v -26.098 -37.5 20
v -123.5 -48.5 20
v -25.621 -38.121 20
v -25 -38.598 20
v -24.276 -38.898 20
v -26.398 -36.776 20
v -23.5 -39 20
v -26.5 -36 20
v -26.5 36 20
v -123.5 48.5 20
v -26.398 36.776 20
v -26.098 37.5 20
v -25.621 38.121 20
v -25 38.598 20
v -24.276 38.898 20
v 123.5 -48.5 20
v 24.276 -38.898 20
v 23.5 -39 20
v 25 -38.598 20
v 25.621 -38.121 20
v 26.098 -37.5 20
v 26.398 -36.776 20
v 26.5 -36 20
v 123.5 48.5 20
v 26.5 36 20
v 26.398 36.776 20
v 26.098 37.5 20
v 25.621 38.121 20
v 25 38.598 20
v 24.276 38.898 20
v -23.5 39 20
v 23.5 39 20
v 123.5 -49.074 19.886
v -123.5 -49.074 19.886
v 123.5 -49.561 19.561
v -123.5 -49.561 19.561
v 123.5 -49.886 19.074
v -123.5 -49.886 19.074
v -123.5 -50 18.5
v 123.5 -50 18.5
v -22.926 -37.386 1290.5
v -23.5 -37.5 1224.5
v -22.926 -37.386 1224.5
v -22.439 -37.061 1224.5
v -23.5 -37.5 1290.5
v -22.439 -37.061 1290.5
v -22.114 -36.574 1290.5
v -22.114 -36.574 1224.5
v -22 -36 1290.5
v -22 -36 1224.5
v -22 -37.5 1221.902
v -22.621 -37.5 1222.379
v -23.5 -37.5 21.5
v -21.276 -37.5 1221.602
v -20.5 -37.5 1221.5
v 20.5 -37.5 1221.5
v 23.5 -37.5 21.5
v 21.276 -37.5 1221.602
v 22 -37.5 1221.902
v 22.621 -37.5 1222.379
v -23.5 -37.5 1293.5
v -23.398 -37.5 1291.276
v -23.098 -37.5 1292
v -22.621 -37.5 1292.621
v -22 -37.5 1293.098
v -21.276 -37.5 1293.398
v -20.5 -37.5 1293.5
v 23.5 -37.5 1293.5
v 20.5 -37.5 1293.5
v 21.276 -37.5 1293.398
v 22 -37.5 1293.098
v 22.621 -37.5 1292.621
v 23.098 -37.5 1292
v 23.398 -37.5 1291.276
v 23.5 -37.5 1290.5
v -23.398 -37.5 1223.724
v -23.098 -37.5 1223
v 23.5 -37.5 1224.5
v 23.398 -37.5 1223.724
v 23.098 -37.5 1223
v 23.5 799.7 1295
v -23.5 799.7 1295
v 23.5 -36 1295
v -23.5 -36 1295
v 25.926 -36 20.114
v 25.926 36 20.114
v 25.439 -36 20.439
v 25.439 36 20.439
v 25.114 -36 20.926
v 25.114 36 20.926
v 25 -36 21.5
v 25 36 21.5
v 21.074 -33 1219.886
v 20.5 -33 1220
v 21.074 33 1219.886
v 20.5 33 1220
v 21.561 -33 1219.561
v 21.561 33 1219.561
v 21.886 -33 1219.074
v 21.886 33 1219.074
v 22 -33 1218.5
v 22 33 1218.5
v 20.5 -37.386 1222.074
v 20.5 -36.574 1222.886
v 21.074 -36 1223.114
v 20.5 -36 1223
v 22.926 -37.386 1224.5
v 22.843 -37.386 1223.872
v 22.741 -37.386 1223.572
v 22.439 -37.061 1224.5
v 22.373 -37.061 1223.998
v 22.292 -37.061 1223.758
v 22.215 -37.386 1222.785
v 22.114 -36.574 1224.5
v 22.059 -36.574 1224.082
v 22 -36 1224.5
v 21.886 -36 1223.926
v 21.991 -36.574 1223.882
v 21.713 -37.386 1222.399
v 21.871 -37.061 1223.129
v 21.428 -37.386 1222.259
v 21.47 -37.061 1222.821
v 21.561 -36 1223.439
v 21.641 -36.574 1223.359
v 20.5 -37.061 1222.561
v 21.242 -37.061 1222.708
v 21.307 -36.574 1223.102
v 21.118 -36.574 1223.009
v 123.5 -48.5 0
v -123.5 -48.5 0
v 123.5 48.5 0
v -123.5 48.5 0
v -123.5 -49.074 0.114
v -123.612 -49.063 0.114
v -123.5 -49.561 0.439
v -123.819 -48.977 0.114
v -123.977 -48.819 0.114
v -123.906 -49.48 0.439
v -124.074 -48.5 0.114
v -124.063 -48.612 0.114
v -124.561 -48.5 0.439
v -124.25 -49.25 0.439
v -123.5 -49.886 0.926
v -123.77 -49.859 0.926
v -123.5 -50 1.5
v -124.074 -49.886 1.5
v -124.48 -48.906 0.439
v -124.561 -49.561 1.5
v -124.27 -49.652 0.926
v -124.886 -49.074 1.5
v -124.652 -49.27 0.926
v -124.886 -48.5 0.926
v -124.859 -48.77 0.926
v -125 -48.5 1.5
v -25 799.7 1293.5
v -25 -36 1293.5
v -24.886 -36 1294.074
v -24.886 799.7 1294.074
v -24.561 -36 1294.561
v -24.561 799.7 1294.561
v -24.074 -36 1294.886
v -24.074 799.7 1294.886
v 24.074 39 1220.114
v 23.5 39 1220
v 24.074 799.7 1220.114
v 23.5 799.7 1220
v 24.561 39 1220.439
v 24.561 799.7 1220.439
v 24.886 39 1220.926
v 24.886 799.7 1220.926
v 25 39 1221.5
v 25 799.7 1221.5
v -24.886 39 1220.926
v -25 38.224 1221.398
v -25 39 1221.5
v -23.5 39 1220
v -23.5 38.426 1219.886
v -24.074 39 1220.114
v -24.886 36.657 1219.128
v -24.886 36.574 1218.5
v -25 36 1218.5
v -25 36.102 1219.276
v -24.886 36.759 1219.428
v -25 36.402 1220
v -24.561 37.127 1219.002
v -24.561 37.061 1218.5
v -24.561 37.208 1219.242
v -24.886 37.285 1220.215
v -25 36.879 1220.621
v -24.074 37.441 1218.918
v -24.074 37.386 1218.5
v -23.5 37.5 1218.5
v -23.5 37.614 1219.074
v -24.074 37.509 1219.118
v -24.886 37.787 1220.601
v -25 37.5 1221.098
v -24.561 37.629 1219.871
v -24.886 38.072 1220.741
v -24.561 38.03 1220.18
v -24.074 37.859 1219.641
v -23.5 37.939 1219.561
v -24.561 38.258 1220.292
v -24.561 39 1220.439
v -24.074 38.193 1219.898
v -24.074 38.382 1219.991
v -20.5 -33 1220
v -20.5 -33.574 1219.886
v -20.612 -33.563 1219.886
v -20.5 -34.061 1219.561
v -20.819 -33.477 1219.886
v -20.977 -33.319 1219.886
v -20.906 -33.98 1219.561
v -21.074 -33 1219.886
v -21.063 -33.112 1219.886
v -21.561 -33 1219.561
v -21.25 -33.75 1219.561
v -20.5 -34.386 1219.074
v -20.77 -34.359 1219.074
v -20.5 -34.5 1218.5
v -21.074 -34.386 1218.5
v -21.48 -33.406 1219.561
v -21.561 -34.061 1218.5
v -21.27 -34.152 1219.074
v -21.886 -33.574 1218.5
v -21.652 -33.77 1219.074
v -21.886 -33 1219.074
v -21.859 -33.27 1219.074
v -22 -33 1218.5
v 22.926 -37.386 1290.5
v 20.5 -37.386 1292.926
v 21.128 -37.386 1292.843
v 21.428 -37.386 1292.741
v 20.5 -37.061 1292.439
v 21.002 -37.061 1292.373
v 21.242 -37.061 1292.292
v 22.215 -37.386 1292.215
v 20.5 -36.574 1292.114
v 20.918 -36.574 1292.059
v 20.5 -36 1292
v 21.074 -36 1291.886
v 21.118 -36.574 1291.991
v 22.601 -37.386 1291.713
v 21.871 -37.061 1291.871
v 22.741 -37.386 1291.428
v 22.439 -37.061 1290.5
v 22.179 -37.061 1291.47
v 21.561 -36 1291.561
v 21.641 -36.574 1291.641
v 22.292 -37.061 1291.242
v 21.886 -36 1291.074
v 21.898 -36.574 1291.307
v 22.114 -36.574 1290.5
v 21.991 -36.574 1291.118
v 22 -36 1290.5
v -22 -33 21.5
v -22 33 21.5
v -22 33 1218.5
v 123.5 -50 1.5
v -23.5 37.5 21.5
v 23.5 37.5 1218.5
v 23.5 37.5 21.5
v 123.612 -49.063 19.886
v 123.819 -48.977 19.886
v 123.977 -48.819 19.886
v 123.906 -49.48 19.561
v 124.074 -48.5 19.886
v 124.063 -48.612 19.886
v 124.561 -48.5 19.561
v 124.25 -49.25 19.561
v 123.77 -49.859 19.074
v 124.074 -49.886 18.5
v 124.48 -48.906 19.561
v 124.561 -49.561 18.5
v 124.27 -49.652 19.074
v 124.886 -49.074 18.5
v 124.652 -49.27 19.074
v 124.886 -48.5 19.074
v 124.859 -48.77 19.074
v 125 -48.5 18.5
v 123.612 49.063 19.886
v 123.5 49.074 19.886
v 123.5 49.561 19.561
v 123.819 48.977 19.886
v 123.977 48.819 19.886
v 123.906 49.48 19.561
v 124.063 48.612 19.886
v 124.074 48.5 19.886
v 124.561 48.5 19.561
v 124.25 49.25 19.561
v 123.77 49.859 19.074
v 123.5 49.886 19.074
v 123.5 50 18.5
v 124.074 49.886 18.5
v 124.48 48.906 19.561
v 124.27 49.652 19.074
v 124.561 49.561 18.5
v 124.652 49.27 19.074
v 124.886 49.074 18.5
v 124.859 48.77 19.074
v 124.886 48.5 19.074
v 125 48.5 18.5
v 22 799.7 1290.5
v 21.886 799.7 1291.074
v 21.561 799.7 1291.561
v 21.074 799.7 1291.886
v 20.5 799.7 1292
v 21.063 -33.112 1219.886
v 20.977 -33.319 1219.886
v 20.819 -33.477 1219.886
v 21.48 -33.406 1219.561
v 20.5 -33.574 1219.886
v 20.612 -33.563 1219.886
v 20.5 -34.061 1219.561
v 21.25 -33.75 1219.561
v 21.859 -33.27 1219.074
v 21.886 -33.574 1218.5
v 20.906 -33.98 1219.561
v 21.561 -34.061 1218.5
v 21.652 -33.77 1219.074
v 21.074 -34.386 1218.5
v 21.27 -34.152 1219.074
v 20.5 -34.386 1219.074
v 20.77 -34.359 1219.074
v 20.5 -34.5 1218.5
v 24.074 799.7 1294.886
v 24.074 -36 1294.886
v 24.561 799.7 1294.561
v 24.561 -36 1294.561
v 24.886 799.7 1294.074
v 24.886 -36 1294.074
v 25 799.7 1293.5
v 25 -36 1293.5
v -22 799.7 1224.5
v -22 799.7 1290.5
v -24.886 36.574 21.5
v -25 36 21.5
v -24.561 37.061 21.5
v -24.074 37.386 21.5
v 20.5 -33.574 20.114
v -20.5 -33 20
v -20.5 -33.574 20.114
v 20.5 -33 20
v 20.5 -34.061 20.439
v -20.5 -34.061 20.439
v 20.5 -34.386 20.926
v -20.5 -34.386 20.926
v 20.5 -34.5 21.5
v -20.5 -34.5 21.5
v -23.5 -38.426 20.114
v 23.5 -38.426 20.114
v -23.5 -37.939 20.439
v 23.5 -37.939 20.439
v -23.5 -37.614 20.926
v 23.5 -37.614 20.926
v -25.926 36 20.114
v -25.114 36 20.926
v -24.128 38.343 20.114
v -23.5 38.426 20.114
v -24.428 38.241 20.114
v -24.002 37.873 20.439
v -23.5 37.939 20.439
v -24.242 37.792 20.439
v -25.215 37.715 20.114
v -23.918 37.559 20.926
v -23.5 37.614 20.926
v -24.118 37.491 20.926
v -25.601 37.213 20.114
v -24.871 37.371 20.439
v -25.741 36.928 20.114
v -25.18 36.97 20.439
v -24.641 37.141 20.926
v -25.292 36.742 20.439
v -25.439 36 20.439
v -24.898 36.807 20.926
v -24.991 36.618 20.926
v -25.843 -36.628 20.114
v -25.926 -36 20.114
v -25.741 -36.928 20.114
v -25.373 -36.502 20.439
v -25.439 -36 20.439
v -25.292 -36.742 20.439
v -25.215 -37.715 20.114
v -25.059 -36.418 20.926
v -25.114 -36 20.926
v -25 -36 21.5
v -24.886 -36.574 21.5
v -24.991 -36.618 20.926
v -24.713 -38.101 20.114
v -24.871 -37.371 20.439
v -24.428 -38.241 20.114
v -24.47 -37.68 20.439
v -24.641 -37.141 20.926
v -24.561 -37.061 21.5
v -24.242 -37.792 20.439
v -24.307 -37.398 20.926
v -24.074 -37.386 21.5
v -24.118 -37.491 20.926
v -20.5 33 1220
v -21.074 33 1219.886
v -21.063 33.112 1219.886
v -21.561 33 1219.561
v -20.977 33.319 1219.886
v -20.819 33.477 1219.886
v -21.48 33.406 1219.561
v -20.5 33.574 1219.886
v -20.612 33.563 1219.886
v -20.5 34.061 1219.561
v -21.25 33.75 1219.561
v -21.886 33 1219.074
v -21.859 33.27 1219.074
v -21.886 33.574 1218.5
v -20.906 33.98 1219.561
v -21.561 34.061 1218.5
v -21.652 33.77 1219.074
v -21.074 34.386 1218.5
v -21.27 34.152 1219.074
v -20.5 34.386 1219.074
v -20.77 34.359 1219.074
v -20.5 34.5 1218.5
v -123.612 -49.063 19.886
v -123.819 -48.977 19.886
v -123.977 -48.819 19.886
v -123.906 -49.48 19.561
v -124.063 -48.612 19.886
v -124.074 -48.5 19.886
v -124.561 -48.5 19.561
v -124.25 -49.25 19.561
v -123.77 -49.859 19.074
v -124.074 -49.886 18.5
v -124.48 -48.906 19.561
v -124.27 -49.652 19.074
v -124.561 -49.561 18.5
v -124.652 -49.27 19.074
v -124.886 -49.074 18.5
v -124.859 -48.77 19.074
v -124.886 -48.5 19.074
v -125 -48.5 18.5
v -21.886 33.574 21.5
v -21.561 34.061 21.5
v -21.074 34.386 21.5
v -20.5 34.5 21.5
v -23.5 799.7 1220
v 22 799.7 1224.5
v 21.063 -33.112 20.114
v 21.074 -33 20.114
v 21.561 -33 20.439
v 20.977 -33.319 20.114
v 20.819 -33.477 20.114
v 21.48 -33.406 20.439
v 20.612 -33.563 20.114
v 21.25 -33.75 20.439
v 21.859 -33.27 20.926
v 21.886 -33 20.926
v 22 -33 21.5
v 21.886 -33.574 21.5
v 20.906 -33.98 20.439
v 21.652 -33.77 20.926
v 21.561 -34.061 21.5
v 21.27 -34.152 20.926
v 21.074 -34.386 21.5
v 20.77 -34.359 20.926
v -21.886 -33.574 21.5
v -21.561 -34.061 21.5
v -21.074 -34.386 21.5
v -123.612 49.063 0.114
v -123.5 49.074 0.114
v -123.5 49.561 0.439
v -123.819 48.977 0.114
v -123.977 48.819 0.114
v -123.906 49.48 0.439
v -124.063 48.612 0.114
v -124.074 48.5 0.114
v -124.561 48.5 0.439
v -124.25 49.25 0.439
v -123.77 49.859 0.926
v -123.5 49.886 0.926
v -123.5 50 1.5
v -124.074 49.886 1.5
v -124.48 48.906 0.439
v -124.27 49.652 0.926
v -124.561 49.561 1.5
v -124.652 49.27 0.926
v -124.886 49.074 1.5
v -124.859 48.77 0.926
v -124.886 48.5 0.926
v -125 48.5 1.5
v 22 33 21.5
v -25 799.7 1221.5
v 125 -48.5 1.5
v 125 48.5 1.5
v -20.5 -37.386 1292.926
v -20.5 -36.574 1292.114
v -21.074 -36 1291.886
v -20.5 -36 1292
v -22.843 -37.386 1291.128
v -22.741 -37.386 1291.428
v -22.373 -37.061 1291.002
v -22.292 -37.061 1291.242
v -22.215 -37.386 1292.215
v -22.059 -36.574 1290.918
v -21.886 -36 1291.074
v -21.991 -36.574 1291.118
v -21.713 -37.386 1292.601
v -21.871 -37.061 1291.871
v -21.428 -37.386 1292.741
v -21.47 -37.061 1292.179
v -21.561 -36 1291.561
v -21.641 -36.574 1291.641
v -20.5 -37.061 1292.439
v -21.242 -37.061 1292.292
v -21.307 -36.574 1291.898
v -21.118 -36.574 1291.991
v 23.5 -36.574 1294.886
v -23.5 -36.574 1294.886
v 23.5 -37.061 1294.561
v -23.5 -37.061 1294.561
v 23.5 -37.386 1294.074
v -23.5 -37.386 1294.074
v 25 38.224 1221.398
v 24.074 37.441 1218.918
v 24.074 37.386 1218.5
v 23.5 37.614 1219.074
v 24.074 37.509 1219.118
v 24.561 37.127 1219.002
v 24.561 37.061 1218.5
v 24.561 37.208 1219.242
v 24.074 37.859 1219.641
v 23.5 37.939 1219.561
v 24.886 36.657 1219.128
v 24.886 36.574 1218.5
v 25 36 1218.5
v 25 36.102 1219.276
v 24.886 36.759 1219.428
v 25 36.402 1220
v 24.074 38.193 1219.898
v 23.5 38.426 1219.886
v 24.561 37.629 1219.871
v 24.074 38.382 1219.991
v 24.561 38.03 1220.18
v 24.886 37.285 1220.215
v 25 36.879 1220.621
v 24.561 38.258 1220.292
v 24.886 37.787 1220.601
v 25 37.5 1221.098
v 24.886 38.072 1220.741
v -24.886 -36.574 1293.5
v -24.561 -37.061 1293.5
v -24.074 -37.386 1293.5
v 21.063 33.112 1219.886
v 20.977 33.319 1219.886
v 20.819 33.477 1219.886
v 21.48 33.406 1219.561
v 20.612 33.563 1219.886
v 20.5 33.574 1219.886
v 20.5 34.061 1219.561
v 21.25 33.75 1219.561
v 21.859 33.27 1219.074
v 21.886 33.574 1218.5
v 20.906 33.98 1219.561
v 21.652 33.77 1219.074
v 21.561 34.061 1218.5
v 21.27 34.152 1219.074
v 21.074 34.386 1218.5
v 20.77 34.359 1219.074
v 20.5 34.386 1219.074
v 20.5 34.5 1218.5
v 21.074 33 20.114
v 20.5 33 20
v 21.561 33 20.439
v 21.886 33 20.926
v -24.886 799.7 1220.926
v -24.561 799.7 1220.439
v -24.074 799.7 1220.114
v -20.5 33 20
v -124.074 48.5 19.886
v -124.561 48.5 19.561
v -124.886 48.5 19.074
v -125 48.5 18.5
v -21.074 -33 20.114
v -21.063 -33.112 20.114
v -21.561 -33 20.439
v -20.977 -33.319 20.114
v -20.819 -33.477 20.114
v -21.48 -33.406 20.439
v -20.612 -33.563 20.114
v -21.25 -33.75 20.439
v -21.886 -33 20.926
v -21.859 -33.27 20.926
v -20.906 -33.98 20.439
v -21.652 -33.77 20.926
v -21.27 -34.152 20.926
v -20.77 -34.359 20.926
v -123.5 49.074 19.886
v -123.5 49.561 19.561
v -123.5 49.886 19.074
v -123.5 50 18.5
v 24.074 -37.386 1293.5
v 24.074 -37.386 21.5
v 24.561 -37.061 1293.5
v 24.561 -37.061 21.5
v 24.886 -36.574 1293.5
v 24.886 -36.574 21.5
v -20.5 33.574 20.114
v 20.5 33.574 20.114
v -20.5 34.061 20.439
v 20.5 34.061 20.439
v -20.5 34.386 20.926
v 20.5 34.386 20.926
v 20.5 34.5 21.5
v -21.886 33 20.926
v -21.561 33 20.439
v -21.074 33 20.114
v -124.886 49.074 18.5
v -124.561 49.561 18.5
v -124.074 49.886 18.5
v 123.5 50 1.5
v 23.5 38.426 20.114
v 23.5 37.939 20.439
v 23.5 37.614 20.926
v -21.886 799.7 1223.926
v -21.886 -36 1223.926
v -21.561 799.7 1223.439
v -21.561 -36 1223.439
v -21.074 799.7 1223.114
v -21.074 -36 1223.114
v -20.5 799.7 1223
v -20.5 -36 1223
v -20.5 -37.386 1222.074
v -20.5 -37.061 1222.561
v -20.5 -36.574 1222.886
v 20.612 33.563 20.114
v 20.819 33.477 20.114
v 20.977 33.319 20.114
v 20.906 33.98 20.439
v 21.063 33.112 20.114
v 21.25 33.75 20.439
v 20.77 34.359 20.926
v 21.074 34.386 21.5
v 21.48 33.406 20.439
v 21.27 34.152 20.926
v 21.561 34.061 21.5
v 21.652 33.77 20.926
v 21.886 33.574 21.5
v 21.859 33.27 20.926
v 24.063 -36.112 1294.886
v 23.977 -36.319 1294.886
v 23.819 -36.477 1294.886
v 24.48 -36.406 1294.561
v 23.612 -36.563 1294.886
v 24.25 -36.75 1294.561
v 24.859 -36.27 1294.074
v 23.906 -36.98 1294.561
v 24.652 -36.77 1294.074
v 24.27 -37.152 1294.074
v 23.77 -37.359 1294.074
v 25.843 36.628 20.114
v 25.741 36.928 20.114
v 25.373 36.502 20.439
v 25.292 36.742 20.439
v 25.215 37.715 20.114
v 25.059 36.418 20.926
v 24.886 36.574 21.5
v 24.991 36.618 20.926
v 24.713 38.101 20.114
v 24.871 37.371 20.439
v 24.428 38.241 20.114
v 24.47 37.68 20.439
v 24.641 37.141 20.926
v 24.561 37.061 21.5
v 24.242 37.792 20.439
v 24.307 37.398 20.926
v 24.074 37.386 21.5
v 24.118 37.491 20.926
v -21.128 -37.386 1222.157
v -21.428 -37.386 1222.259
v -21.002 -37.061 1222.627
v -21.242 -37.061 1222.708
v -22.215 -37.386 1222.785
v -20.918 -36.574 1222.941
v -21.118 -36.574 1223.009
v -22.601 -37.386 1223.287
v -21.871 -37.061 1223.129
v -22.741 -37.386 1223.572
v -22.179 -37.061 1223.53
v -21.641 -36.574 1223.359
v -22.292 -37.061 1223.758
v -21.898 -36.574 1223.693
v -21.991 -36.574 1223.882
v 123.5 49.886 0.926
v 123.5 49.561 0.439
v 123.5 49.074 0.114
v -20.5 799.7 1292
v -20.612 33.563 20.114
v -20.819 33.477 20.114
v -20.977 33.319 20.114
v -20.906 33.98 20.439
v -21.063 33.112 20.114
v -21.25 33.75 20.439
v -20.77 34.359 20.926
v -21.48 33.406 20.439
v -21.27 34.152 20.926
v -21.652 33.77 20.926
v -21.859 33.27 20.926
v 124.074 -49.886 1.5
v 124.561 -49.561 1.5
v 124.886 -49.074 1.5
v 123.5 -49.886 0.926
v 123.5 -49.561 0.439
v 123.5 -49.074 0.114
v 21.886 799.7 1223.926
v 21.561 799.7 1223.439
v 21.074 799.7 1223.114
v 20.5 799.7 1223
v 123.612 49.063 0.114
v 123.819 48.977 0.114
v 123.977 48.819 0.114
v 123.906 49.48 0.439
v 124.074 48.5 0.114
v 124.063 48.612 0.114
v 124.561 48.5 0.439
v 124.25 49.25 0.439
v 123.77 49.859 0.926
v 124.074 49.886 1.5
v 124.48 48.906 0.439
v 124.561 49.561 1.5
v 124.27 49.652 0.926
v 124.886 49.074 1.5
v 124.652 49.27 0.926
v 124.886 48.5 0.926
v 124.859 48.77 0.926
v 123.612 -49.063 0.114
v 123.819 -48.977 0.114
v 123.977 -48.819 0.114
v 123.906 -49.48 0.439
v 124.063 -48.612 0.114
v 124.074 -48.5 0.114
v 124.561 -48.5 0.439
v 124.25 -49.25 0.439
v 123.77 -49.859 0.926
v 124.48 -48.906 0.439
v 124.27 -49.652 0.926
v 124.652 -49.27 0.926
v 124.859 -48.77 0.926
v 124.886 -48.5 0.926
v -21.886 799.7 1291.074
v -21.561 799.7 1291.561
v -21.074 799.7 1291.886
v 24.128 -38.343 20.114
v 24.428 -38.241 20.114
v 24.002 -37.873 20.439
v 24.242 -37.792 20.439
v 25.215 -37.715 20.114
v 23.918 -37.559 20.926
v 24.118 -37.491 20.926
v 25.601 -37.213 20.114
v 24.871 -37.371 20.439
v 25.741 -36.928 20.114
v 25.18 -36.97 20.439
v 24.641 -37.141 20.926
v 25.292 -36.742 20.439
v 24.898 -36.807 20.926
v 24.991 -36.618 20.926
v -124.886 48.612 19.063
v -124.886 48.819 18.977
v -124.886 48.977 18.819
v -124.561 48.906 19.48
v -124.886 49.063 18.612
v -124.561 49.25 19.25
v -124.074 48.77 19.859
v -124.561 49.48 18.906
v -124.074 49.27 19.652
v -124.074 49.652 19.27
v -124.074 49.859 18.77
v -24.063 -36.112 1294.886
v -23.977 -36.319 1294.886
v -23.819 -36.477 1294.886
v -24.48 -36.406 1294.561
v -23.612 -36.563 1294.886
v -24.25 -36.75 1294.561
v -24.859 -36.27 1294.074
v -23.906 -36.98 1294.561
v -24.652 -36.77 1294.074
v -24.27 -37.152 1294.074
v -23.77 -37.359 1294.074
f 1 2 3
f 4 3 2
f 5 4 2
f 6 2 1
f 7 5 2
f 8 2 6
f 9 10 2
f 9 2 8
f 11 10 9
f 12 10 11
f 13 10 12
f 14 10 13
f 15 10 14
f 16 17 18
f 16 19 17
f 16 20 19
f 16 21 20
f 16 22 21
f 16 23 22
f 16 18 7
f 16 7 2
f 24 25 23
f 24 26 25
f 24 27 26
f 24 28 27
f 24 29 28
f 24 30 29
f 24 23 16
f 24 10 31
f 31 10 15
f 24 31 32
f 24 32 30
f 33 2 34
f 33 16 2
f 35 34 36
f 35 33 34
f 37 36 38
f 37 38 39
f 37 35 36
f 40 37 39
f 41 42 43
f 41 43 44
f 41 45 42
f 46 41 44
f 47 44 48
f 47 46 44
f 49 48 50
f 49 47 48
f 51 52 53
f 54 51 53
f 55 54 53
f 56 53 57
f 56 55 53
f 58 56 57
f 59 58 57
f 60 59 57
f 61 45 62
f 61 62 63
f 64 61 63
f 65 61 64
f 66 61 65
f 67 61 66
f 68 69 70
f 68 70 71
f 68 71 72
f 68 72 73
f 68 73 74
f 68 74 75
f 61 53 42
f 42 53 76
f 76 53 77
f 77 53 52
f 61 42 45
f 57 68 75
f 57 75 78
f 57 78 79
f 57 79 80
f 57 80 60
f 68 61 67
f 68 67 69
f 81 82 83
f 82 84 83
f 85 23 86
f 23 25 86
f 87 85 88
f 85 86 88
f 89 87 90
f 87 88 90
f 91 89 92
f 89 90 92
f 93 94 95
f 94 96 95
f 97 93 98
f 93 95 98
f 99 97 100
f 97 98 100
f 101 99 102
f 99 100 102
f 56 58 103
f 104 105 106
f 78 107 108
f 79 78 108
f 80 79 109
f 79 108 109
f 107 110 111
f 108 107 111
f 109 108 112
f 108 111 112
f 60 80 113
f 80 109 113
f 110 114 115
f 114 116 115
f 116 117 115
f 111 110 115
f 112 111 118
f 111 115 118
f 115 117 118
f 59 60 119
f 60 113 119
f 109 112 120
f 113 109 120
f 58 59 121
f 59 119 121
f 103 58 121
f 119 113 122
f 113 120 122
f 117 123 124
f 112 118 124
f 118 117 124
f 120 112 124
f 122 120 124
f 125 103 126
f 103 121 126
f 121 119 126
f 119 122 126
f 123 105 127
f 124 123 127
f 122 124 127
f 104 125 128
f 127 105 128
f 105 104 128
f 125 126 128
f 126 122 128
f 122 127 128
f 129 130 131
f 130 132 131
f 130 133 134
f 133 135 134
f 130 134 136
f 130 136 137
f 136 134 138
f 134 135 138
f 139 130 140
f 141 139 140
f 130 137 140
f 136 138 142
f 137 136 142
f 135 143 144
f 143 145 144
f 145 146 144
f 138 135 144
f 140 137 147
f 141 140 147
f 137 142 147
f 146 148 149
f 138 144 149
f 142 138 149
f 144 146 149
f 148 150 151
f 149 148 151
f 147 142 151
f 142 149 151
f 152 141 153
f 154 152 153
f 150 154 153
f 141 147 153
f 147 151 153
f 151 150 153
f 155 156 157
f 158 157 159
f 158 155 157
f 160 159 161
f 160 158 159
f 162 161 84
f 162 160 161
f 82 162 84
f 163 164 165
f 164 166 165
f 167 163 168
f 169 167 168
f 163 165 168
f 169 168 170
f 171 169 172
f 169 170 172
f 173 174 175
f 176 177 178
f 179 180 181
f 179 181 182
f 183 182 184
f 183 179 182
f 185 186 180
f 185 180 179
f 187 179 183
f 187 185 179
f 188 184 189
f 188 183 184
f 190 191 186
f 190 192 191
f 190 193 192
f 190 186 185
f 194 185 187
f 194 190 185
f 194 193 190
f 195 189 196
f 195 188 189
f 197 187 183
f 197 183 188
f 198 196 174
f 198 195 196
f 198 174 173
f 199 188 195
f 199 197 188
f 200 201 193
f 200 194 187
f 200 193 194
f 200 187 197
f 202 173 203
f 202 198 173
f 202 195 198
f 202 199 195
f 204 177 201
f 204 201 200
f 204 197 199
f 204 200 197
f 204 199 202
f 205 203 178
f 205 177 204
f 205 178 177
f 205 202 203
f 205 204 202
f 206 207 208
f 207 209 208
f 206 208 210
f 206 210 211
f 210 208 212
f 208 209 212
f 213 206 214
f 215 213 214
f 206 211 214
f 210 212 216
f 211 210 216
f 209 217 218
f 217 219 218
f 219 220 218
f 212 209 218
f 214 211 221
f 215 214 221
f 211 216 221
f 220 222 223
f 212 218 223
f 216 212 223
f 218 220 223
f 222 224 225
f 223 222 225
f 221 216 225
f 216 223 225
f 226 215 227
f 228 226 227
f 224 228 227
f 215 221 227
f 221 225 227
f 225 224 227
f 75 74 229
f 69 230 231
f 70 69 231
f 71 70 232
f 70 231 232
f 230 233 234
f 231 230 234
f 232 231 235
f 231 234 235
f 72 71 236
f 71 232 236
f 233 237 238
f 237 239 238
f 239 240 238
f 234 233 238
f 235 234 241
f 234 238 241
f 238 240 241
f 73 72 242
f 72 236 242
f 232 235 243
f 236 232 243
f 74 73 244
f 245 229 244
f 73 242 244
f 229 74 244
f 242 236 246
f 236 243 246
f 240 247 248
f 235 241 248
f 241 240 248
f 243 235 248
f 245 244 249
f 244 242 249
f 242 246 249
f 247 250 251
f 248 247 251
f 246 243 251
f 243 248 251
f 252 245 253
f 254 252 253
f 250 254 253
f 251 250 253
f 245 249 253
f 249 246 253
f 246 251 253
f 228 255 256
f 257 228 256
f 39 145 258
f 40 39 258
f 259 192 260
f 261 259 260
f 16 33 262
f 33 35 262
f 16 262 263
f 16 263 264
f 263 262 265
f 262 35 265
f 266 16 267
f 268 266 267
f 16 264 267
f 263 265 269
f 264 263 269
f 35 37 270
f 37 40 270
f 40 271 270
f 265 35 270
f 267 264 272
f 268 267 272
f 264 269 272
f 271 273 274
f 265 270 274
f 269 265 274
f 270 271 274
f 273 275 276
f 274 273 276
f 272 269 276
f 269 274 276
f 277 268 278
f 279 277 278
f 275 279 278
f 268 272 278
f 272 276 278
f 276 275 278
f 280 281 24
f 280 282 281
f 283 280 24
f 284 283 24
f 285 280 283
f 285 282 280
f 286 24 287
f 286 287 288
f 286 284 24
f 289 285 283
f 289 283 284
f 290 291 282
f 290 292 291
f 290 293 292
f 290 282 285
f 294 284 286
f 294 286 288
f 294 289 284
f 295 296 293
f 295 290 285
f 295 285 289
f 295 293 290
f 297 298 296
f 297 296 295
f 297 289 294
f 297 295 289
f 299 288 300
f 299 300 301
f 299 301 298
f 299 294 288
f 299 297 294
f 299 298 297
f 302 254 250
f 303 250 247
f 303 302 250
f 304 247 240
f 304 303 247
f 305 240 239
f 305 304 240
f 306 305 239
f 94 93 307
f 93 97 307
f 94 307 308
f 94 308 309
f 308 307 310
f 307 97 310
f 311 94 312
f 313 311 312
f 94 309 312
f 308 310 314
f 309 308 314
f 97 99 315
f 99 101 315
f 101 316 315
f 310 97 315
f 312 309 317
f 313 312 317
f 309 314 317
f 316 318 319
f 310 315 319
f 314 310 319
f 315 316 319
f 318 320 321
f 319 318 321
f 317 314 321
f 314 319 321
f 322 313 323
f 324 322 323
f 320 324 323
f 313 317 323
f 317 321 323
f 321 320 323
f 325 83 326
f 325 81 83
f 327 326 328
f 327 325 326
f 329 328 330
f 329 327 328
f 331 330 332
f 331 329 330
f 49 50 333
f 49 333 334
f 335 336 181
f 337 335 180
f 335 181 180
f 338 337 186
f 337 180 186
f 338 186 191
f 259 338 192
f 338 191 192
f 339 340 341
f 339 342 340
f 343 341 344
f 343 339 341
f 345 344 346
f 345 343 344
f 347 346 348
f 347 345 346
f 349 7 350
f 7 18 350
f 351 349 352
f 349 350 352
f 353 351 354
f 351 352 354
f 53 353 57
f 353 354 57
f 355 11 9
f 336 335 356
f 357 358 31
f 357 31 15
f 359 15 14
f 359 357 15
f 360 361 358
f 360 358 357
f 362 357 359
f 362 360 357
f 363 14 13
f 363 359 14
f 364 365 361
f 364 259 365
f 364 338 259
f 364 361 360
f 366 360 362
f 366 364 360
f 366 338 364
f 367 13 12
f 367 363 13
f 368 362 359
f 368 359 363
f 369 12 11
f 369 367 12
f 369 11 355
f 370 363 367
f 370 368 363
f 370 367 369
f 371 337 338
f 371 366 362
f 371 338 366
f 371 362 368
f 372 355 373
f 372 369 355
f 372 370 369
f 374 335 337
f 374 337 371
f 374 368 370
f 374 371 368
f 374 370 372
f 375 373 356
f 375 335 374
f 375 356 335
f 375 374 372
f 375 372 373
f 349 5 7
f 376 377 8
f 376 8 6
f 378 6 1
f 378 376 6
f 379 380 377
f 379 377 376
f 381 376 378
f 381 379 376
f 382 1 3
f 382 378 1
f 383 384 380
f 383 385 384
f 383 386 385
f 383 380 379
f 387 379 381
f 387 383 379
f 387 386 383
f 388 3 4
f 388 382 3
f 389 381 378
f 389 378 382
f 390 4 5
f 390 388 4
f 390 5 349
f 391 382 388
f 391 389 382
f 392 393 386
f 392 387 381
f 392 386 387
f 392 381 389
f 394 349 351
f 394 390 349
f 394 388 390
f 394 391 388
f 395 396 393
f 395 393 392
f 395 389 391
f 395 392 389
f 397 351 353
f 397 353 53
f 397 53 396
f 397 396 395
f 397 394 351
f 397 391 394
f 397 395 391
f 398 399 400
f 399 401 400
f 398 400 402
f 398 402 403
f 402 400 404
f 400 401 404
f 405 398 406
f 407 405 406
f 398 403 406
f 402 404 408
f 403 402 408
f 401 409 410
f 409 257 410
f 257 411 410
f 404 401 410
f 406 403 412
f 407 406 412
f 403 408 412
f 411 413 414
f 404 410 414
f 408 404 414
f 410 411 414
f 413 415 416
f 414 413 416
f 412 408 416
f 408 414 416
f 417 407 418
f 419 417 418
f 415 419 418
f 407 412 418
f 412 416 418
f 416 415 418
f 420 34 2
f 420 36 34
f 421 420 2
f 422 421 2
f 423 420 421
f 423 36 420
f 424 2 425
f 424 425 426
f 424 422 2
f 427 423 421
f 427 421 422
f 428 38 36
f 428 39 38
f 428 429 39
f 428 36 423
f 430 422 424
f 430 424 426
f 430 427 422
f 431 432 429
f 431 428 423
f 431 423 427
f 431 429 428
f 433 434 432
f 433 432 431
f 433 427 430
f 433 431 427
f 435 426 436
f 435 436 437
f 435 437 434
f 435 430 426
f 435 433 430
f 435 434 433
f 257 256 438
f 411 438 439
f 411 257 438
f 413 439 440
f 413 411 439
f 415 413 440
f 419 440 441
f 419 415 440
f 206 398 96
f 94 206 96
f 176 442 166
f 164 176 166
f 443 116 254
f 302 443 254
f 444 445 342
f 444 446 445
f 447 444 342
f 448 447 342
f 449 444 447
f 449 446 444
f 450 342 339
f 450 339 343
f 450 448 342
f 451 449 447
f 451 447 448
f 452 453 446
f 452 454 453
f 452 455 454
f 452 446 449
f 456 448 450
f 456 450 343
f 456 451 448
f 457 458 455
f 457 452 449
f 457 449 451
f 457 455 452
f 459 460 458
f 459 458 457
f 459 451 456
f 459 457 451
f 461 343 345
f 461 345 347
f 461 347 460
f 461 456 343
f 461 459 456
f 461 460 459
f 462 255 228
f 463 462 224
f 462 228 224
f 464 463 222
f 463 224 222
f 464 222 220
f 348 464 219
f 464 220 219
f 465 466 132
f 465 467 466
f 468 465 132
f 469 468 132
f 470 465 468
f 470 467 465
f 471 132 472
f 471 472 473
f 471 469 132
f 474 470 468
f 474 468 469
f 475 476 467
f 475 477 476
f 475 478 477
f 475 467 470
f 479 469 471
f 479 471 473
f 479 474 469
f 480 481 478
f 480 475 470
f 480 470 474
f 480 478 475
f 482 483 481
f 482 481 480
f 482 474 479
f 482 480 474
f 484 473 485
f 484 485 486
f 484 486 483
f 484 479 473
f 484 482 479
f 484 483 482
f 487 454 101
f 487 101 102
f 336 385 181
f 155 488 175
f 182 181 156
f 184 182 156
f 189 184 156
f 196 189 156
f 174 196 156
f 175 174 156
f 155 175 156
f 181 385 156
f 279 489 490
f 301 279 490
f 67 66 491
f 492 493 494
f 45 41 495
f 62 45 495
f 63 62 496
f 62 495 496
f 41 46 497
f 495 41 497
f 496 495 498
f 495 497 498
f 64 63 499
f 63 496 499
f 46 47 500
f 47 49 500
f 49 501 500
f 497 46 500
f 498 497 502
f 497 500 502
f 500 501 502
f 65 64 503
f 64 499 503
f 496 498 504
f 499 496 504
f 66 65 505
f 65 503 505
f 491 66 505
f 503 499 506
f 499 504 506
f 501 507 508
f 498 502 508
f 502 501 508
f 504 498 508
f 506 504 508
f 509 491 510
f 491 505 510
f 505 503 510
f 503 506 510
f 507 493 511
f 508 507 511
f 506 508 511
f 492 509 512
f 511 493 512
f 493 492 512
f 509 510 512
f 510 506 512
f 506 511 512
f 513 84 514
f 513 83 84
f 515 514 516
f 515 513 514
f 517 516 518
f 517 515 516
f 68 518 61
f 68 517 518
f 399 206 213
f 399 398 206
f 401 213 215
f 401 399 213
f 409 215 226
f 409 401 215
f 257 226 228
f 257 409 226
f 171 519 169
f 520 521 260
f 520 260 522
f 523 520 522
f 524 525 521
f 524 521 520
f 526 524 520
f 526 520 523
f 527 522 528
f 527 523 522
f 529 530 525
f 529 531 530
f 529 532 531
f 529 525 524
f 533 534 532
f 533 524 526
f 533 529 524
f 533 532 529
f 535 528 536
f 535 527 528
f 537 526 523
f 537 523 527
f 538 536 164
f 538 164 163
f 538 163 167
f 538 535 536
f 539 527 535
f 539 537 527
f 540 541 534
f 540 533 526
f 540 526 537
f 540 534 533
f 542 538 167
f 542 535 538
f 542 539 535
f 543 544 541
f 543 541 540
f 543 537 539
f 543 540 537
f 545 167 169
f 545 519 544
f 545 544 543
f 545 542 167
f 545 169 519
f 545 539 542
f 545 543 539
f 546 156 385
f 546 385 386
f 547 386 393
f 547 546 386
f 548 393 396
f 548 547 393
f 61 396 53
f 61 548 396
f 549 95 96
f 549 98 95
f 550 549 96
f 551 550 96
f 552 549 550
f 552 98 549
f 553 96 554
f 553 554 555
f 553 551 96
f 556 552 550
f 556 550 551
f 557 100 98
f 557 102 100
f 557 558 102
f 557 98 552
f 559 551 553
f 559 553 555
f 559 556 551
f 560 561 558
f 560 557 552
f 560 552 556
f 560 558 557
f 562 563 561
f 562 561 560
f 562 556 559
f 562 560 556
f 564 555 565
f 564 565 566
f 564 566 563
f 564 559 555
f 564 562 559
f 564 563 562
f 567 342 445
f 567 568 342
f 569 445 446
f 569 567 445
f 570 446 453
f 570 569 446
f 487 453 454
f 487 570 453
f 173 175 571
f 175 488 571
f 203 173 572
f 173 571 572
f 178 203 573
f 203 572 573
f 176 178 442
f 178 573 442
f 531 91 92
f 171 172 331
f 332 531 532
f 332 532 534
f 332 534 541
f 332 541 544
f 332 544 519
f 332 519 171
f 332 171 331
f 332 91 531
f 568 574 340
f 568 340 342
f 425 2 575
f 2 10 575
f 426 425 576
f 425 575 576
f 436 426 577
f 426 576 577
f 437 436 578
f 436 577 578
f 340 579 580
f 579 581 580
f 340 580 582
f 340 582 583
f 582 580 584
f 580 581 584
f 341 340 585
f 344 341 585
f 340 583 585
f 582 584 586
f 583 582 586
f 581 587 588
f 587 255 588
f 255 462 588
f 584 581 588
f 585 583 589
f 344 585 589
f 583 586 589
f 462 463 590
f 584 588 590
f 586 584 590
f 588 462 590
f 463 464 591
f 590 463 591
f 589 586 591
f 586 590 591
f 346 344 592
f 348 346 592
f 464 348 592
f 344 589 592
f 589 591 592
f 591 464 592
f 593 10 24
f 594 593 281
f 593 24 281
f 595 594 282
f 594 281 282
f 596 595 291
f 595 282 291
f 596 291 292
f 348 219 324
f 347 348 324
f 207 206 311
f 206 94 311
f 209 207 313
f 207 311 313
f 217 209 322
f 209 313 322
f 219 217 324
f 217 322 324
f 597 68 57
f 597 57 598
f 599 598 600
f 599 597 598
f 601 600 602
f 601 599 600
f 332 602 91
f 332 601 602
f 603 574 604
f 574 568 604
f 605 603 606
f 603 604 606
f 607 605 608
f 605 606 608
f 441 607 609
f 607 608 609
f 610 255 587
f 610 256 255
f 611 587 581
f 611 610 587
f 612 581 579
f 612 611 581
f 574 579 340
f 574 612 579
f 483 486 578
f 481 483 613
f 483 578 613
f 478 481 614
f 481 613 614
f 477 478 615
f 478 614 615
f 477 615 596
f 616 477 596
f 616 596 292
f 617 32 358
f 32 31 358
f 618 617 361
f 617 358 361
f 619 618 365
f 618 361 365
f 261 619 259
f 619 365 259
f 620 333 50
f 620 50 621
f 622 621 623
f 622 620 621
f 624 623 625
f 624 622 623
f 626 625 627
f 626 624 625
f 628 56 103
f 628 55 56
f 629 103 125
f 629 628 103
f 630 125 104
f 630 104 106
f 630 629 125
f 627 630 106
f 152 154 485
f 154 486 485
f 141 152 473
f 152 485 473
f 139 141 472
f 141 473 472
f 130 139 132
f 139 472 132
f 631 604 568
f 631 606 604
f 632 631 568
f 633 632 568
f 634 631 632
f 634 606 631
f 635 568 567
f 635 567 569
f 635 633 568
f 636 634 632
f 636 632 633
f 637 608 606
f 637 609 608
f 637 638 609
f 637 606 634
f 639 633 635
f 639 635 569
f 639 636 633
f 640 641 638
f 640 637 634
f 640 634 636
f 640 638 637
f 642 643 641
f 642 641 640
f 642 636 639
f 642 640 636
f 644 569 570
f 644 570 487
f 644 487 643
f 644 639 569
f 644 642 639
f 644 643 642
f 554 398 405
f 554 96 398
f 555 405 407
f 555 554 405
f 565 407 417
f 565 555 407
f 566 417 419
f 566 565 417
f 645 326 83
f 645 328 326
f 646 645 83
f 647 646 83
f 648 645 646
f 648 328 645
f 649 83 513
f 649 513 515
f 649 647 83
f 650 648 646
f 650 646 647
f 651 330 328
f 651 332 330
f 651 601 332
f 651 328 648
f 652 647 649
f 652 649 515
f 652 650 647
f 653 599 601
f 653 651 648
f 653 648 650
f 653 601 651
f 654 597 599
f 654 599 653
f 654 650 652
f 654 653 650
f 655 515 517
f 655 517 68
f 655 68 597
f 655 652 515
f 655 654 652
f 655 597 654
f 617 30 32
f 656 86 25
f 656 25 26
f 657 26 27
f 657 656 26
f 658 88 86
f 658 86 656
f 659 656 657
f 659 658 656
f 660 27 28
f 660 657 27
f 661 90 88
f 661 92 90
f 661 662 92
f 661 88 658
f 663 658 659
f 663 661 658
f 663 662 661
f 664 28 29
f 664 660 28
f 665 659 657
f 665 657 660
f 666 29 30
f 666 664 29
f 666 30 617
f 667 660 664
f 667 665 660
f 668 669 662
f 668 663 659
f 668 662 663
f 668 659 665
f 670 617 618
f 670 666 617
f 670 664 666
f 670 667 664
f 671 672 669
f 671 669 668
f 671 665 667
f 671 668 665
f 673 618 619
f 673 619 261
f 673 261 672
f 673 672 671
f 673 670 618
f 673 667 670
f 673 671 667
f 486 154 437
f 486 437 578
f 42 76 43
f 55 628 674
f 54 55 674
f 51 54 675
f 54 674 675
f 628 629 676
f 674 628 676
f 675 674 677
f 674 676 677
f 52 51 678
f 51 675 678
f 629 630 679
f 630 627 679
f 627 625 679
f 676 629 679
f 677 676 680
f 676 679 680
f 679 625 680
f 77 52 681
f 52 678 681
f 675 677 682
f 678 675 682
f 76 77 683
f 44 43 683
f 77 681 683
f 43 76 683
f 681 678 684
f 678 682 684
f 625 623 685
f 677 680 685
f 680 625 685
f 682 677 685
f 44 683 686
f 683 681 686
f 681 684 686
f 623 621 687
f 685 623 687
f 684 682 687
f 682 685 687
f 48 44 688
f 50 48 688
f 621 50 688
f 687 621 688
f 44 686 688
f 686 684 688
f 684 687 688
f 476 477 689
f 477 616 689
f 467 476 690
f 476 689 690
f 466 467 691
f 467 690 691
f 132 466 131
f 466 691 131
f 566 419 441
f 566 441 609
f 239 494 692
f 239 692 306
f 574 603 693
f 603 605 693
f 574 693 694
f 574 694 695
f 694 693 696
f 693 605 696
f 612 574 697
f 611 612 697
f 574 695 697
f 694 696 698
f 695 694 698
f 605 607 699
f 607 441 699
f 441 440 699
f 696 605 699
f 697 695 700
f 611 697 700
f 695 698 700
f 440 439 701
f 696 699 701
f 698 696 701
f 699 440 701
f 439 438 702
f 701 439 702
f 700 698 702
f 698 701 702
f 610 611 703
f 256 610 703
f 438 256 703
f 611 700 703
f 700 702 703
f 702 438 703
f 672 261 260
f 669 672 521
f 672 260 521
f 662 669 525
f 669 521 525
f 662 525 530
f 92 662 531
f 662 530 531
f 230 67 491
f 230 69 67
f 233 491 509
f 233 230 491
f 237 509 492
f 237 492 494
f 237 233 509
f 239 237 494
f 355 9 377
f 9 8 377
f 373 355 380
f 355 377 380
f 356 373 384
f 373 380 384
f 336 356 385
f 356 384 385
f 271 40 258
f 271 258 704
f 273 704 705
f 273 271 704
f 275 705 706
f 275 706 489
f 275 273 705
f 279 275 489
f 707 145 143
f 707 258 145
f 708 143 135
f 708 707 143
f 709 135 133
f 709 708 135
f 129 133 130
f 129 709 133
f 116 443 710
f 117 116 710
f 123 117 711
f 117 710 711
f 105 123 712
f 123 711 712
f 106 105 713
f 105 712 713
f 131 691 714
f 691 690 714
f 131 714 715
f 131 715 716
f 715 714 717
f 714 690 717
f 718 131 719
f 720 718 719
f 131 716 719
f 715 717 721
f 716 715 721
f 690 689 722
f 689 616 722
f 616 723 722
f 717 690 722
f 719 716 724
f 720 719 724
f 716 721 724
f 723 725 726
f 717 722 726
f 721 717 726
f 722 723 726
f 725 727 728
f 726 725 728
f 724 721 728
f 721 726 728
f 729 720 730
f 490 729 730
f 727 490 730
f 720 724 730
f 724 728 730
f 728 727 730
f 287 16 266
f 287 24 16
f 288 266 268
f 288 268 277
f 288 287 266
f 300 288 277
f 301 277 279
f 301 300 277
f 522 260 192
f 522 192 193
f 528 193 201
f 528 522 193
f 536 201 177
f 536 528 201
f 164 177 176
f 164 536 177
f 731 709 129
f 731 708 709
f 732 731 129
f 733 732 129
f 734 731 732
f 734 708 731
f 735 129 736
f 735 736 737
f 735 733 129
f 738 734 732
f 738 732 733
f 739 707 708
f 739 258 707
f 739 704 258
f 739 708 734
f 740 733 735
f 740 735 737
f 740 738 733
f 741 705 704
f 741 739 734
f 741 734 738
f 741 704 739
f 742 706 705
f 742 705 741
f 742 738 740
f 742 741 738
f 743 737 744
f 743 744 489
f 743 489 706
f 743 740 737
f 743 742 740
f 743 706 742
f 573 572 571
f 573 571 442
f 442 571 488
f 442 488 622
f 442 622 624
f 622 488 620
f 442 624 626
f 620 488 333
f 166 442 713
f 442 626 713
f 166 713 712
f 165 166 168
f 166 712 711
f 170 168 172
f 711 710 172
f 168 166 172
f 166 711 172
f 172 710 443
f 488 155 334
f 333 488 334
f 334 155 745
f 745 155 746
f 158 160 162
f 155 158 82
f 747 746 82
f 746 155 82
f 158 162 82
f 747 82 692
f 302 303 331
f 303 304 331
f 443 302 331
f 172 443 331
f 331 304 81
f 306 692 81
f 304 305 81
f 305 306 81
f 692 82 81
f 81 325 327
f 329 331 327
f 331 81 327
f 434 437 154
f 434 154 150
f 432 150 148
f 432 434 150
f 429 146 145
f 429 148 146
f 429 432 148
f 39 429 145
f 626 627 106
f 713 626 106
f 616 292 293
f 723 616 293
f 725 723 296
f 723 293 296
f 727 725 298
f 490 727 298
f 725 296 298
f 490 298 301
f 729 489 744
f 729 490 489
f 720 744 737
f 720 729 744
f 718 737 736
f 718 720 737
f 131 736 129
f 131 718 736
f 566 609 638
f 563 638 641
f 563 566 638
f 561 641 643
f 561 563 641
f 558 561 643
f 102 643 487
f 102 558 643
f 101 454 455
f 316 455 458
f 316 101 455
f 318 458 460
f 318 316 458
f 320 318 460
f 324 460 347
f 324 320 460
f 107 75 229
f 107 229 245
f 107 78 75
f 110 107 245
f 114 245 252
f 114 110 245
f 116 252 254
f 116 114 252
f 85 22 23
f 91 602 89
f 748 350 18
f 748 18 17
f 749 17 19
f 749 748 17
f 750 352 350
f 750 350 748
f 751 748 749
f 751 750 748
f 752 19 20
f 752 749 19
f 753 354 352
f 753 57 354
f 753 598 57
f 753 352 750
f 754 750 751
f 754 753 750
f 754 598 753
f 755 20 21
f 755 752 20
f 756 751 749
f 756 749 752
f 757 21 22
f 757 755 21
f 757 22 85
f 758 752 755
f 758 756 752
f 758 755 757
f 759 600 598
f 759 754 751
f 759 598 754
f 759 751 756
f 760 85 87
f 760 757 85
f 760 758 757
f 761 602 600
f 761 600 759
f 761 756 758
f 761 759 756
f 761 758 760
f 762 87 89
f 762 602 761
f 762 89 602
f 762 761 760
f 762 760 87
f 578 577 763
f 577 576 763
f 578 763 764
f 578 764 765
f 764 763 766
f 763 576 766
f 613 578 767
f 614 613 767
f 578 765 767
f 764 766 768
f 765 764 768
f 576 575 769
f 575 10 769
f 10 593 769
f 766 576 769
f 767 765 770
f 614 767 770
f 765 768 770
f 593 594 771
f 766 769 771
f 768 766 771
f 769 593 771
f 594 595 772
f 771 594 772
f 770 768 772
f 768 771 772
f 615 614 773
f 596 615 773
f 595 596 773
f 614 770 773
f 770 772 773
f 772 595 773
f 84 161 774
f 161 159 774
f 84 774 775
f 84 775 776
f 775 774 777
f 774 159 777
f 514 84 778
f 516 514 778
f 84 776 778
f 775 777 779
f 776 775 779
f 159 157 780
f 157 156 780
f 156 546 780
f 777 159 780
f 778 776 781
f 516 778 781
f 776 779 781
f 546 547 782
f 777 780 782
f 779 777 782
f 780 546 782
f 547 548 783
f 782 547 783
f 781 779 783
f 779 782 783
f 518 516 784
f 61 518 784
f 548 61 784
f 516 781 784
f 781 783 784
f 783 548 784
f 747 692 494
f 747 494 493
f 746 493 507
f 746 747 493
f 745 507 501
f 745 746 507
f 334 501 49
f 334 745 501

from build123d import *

# Parameters (mm, degrees)
F0_W     = 250
F0_H     = 100
F1_DEPTH = 20
F2_W     = 50
F2_H     = 75
F2_W_2   = 44
F2_H_2   = 69
F3_DEPTH = 1200
F4_W     = 50
F4_H     = 75
F4_W_2   = 44
F4_H_2   = 69
F5_DEPTH = 837.2
F6_F1_R  = 1.5
F6_F2_R  = 1.5
F6_F3_R  = 1.5
F6_F4_R  = 1.4999


# Not quite as in the source:
# - a fillet or chamfer is up to 0.001 mm smaller than in the source, because OpenCascade refuses the exact size


with BuildPart() as f1:
    # F0 (on Top) → F1 (new body)
    with BuildSketch(Plane.XY):
        Rectangle(F0_W, F0_H)
    extrude(amount=F1_DEPTH)

    # F2 (on face) → F3 (join)
    with BuildSketch(Plane.XY.offset(20)):
        Rectangle(F2_W, F2_H)
        Rectangle(F2_W_2, F2_H_2, mode=Mode.SUBTRACT)
    extrude(amount=F3_DEPTH)

    # F4 (on face) → F5 (join)
    with BuildSketch(Plane.XZ.offset(37.5)):
        with Locations((0, 1257.5)):
            Rectangle(F4_W, F4_H)
        with Locations((0, 1257.5)):
            Rectangle(F4_W_2, F4_H_2, mode=Mode.SUBTRACT)
    extrude(amount=-F5_DEPTH)

    # F6: fillet of radius 1.5 on 44 edges, made by hand

    # F6_f1
    f6_f1_edges = [f1.edges().sort_by_distance(p)[0] for p in [
        (-22, -34.5, 620),
        (22, 34.5, 620),
        (22, -34.5, 620),
        (-22, 34.5, 620),
        (-22, 381.1, 1292),
        (22, 381.1, 1292),
        (0, 37.5, 1220),
        (22, 381.1, 1223),
        (-22, 381.1, 1223),
        (22, 0, 1220),
        (0, -34.5, 1220),
        (-22, 0, 1220),
        (0, 34.5, 1220),
        (0, 34.5, 20),
        (-22, 0, 20),
        (22, 0, 20),
        (0, -34.5, 20),
    ]]
    fillet(f6_f1_edges, radius=F6_F1_R)

    # F6_f2
    f6_f2_edges = [f1.edges().sort_by_distance(p)[0] for p in [
        (-25, -37.5, 657.5),
        (25, 37.5, 619.25),
        (25, -37.5, 657.5),
        (-25, 37.5, 619.25),
        (25, 381.1, 1295),
        (-25, 381.1, 1295),
        (0, -37.5, 1295),
        (125, -50, 10),
        (-125, -50, 10),
        (125, 50, 10),
        (0, -50, 0),
        (0, -50, 20),
        (0, 50, 20),
        (125, 0, 20),
        (-125, 0, 20),
        (-125, 50, 10),
        (0, 50, 0),
        (125, 0, 0),
        (-125, 0, 0),
        (-25, 37.9393398282, 1219.5606601718),
        (25, 37.9393398282, 1219.5606601718),
    ]]
    fillet(f6_f2_edges, radius=F6_F2_R)

    # F6_f3
    f6_f3_edges = [f1.edges().sort_by_distance(p)[0] for p in [
        (25, 0, 20),
        (-25, 0, 20),
        (0, -37.5, 20),
        (0, 37.5, 20),
        (24.5606601718, 37.0606601718, 20),
        (-24.5606601718, 37.0606601718, 20),
        (-24.5606601718, -37.0606601718, 20),
        (24.5606601718, -37.0606601718, 20),
    ]]
    fillet(f6_f3_edges, radius=F6_F3_R)

    # F6_f4 (radius 1.5 in the source; OpenCascade refuses exactly that, so slightly less here)
    f6_f4_edges = [f1.edges().sort_by_distance(p)[0] for p in [
        (-22, -37.5, 1257.5),
        (0, -37.5, 1223),
        (0, -37.5, 1292),
        (22, -37.5, 1257.5),
        (21.5606601718, -37.5, 1291.5606601718),
        (21.5606601718, -37.5, 1223.4393398282),
        (-21.5606601718, -37.5, 1291.5606601718),
        (-21.5606601718, -37.5, 1223.4393398282),
    ]]
    fillet(f6_f4_edges, radius=F6_F4_R)


solid = f1.part
